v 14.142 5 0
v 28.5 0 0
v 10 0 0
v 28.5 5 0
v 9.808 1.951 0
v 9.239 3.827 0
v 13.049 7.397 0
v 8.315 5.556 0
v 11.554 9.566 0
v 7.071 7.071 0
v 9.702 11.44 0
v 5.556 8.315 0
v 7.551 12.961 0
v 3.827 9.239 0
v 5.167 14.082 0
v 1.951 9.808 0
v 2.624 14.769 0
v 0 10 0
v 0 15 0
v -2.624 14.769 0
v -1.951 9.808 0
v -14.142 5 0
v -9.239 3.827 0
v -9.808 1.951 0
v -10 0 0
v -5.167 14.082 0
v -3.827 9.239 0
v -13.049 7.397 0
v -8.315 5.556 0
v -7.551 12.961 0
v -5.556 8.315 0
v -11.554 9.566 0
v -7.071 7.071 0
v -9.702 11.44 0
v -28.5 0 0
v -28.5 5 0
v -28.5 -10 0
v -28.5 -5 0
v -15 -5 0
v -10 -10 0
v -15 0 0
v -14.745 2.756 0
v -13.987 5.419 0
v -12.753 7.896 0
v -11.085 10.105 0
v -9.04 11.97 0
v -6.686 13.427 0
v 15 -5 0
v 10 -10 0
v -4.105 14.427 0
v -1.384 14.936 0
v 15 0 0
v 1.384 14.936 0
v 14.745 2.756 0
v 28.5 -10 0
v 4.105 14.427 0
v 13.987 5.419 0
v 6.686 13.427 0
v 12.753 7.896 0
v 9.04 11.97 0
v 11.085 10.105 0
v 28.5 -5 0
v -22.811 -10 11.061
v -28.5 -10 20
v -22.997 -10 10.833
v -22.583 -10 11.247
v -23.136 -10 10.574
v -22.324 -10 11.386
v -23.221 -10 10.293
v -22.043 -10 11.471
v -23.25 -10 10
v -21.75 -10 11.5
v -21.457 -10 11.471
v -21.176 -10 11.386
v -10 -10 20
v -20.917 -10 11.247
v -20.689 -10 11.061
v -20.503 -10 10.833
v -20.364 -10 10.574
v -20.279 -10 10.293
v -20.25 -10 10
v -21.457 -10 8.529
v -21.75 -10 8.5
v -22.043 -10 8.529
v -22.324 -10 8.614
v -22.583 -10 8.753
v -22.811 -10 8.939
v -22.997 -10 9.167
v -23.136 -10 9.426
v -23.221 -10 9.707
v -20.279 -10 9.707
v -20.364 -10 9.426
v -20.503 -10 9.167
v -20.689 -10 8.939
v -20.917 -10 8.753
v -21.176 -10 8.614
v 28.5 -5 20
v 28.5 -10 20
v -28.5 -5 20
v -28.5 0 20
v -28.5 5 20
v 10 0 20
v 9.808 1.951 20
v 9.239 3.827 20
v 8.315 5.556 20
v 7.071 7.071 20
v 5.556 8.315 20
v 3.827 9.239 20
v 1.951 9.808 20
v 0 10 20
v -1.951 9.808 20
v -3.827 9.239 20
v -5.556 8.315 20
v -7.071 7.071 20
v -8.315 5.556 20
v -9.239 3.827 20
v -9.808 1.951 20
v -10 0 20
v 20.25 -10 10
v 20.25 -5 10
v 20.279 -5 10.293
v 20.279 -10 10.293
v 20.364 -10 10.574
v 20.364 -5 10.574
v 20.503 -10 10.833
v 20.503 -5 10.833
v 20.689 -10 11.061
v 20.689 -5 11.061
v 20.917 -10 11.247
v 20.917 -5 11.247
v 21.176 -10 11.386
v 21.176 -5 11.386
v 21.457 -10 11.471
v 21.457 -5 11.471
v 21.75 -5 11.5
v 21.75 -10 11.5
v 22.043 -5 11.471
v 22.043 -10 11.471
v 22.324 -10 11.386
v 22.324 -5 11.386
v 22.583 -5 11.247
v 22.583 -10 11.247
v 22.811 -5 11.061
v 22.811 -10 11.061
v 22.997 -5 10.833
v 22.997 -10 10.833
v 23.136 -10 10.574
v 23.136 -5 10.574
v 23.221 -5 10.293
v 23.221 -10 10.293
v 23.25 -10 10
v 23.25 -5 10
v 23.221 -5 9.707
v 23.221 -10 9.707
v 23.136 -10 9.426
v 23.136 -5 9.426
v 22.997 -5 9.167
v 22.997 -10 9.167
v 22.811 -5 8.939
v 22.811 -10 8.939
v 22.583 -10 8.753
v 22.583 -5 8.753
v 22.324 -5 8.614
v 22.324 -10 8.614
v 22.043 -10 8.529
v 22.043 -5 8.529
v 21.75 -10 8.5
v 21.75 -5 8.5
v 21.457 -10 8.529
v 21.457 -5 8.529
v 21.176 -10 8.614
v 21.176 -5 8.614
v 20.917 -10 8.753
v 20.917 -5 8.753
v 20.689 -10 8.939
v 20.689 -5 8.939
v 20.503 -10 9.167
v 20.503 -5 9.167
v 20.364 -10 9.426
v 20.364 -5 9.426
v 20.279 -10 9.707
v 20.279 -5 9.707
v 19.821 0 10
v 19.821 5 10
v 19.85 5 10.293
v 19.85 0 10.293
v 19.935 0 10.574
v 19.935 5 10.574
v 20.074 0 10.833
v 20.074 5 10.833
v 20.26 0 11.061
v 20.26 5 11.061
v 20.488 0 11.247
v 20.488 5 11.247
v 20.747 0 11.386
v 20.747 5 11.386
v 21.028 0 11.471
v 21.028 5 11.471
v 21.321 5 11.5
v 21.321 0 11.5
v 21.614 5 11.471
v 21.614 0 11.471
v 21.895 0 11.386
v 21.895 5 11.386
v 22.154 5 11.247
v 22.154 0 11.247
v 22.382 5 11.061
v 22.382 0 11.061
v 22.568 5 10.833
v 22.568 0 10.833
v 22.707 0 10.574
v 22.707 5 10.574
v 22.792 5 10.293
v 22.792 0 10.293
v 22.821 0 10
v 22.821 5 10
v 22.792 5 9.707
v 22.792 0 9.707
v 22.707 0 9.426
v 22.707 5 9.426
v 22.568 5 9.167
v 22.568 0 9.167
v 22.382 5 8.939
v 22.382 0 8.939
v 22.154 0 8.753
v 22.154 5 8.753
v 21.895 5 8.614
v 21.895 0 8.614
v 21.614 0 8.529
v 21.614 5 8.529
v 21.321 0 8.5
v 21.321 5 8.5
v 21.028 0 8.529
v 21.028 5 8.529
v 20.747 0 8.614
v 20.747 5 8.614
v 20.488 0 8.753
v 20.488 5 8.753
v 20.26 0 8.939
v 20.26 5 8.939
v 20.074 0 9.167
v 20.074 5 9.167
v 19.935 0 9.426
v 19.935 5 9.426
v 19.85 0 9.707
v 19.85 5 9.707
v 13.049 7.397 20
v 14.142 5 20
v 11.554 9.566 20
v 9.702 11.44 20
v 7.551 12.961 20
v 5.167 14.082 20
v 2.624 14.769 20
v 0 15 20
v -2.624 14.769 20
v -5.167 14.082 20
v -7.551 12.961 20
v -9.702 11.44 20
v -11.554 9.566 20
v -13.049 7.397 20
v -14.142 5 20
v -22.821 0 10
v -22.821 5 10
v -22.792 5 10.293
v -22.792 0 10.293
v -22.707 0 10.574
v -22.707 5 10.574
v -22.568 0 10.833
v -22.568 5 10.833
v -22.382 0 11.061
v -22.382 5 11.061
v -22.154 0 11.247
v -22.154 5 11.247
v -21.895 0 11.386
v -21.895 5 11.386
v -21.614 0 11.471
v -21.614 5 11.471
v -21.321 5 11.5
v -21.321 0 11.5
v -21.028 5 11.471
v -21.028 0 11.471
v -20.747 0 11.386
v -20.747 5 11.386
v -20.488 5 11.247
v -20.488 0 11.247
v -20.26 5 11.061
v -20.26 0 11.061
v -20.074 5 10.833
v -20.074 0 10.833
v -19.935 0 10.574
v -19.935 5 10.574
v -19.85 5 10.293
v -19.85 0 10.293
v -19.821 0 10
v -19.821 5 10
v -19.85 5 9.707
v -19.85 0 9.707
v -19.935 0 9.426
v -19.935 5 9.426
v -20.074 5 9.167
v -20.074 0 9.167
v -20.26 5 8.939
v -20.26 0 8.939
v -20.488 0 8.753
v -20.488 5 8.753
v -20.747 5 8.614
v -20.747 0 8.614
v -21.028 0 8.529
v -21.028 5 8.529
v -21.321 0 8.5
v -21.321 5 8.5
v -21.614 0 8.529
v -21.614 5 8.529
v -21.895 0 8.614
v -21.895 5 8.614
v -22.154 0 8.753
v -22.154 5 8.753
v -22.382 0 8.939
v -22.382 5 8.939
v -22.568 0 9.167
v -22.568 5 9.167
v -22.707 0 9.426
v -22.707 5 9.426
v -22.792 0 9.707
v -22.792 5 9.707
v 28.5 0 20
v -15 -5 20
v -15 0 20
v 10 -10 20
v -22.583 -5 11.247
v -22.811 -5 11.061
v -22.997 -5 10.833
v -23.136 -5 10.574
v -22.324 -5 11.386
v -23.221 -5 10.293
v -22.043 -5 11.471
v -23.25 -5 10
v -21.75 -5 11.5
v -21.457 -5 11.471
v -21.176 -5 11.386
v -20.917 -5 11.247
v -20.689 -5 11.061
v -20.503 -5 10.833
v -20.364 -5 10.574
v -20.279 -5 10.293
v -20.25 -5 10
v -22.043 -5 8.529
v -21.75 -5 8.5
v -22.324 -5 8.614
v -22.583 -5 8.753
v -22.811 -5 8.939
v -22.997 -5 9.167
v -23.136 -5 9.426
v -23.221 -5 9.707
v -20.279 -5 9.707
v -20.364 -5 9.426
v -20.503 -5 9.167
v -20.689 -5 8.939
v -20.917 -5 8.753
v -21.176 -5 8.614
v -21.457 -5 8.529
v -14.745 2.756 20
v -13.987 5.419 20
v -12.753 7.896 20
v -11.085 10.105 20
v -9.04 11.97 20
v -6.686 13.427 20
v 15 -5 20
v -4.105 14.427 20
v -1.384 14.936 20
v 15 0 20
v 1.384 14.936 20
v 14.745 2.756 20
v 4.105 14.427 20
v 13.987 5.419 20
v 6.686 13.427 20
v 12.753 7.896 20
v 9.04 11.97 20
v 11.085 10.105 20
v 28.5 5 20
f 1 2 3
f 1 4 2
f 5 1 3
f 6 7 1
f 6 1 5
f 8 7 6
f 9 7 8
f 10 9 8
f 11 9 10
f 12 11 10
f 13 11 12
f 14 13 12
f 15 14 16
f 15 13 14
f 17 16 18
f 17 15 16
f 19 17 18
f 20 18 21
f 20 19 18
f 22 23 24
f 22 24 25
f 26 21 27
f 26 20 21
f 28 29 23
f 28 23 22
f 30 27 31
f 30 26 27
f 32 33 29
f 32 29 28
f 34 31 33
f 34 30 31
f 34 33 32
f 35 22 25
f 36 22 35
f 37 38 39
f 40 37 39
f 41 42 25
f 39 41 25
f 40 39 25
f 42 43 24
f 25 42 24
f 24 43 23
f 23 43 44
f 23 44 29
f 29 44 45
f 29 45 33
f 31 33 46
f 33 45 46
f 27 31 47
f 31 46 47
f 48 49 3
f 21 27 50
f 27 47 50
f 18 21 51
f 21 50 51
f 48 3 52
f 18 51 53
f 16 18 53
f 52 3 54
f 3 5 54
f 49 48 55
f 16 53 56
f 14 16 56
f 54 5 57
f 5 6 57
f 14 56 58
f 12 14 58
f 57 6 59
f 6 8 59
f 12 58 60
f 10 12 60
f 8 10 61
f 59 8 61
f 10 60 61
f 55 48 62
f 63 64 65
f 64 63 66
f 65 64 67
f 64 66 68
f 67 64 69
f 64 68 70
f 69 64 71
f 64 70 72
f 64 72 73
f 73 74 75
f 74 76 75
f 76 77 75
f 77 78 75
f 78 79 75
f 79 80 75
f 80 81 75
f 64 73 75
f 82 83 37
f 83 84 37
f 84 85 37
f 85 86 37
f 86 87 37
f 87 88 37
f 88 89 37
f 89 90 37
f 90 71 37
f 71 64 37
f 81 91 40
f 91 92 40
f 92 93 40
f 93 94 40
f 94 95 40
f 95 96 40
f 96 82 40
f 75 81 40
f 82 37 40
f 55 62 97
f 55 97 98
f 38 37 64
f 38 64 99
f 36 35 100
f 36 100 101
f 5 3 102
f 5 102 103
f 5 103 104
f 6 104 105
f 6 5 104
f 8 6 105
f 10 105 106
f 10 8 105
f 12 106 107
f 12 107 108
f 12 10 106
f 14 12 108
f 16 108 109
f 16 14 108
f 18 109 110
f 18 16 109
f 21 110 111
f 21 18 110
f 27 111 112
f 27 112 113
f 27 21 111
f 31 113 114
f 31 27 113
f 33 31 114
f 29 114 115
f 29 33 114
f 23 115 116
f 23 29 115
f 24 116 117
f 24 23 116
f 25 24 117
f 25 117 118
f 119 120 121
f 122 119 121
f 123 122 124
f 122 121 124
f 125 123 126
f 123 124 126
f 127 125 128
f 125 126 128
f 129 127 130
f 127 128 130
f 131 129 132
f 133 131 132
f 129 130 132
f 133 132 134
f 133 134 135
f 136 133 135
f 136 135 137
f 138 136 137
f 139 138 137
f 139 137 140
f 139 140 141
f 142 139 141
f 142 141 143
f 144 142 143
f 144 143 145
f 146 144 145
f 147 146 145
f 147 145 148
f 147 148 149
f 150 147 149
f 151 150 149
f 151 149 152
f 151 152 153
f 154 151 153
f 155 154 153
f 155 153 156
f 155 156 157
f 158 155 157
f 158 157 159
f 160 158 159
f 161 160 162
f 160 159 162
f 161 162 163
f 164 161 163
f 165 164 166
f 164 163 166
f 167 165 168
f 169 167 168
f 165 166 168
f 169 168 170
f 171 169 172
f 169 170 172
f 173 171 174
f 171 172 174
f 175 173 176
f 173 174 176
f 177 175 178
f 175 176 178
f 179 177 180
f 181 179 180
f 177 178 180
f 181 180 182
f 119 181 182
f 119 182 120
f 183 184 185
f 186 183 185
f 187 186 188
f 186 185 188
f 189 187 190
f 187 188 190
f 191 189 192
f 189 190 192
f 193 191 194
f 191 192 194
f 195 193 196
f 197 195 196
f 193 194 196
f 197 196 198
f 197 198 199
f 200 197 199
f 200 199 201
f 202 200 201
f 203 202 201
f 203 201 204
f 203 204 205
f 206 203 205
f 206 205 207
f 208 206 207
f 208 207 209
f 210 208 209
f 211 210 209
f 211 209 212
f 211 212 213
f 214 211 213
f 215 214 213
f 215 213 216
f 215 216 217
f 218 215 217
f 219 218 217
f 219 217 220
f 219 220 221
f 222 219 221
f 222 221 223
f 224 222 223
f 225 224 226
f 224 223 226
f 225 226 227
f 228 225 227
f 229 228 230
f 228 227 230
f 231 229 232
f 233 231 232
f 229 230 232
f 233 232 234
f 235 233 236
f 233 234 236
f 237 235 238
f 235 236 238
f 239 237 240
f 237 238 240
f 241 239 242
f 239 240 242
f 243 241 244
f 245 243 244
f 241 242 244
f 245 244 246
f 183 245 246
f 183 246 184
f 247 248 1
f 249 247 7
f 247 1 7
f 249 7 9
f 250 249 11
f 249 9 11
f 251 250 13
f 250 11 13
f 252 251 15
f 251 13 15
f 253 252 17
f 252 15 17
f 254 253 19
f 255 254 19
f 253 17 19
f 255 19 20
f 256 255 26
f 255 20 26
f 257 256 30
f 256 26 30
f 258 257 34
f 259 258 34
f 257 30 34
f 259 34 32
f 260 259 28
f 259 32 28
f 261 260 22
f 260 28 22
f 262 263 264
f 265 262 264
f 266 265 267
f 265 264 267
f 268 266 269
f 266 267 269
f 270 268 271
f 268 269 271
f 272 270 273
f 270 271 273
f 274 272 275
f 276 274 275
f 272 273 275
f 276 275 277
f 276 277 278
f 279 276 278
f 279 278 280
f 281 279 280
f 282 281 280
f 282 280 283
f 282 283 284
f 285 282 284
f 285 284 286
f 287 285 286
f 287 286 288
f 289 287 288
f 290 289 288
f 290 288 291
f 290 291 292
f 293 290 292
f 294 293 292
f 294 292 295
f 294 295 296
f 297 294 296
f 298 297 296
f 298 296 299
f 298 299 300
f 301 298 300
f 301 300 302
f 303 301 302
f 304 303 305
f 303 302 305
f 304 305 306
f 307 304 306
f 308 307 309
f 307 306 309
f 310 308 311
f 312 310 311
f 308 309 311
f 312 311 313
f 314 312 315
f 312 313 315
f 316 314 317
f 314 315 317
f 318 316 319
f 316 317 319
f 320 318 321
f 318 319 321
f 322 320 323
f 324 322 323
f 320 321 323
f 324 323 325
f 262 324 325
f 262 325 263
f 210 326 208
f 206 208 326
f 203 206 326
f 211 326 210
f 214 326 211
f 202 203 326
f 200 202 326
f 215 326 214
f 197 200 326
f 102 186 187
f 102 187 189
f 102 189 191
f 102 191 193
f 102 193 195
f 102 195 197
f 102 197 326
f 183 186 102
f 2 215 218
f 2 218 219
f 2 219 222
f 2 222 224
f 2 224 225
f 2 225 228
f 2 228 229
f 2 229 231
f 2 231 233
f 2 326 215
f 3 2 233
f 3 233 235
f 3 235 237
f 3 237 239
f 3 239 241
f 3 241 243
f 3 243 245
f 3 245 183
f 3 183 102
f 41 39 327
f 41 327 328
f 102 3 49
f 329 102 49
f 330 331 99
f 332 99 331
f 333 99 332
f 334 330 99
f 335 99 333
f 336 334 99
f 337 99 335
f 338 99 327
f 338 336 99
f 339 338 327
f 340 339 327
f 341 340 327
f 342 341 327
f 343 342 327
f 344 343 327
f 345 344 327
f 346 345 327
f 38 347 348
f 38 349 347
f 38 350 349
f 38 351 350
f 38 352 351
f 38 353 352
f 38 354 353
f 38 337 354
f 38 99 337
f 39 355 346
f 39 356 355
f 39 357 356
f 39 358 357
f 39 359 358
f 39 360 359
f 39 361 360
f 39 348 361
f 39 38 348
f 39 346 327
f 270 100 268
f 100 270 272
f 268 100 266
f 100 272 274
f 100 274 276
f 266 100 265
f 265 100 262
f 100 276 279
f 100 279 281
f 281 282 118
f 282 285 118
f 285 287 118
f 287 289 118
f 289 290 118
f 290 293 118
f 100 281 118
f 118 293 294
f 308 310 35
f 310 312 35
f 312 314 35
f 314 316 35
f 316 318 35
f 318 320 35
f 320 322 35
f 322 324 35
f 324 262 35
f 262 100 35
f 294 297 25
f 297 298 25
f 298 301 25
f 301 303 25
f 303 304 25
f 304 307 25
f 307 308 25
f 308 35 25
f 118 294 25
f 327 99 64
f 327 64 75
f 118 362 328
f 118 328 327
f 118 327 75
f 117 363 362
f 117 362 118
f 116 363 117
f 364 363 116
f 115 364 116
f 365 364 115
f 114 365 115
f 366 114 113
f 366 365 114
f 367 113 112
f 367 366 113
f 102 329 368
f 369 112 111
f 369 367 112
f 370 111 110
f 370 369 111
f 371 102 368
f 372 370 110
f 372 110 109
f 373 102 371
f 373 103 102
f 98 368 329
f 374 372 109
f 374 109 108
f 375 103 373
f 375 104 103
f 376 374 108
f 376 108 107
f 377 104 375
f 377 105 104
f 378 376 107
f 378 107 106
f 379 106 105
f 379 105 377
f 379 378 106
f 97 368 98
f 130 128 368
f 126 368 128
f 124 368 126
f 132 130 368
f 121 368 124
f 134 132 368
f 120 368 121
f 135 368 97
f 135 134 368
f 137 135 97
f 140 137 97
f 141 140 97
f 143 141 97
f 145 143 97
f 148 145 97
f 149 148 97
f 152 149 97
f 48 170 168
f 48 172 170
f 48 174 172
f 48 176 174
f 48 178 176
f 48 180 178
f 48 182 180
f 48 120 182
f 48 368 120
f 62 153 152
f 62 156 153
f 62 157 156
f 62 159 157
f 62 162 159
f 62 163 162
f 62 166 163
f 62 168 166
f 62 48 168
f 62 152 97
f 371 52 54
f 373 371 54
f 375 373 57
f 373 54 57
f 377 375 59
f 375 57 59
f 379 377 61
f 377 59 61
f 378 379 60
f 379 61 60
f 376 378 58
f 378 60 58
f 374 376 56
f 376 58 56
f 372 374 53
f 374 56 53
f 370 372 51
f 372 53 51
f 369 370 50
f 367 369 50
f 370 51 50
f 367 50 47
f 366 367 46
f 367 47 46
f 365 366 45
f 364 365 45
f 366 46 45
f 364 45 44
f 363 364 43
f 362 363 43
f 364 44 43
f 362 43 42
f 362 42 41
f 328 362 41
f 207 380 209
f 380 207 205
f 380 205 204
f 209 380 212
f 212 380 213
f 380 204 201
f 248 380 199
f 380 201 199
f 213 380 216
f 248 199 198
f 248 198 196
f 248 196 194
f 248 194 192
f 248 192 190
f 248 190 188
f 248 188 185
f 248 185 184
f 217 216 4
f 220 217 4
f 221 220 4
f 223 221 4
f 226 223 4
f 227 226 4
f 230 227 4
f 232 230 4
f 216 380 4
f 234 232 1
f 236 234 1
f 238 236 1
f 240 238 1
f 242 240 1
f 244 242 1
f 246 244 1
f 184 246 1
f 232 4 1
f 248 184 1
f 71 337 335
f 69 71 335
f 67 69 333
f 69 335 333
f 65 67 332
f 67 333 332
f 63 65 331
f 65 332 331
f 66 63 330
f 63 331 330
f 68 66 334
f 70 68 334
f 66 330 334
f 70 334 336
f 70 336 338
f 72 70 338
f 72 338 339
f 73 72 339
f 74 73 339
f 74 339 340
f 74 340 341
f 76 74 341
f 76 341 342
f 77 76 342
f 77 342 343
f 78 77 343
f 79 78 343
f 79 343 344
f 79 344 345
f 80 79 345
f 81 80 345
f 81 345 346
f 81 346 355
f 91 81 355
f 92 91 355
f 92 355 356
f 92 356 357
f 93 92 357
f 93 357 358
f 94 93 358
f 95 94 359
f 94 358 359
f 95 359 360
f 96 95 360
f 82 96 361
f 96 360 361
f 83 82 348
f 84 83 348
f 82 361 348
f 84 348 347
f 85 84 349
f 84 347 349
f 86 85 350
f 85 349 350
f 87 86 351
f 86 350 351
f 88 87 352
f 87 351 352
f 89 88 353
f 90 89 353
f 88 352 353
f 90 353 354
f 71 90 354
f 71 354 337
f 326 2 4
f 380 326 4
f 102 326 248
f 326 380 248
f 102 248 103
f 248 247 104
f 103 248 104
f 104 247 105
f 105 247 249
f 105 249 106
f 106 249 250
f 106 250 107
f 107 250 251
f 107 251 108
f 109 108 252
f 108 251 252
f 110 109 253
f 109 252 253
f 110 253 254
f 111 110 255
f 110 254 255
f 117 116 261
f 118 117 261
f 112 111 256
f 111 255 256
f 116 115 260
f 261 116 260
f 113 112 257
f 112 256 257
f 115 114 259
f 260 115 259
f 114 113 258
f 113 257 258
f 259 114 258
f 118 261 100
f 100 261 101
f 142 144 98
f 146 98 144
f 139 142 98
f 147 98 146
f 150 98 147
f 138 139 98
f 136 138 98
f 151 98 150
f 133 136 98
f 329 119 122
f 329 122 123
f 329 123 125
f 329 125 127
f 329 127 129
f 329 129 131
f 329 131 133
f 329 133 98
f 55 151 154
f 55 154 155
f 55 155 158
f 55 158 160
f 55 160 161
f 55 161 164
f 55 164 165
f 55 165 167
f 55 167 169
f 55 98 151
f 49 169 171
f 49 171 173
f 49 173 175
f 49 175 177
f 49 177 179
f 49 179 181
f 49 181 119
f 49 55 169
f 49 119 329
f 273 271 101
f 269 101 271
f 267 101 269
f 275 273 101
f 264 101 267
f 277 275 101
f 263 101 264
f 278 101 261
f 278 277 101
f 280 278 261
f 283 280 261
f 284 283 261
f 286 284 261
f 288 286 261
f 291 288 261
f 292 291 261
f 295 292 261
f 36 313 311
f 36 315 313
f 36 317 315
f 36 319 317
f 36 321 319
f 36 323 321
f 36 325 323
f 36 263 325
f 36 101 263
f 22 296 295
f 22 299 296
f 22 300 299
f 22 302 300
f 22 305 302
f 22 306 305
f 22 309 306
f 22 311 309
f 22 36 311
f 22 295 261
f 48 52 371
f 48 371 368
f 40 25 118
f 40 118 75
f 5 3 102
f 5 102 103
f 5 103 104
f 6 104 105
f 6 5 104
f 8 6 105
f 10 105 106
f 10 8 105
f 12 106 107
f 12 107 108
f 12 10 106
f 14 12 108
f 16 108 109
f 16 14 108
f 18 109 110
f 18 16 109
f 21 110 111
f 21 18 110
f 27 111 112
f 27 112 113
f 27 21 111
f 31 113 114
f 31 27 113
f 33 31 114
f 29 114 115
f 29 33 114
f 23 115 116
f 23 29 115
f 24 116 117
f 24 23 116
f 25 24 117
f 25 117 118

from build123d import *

# Parameters (mm, degrees)
PAD_DEPTH       = 20
SKETCH001_R     = 1.5
POCKET_DEPTH    = 5.001
PAD001_DEPTH    = 20
SKETCH004_R     = 1.5
POCKET001_DEPTH = 5.001


with BuildPart() as body:
    # Sketch → Pad (new body)
    with BuildSketch(Plane.XY):
        with BuildLine():
            Line((28.5, 0), (10, 0))
            ThreePointArc((10, 0), (0, 10), (-10, 0))
            Line((-28.5, 0), (-10, 0))
            Line((-28.5, 0), (-28.5, 5))
            Line((-28.5, 5), (-14.142136, 5))
            ThreePointArc((14.142136, 5), (0, 15), (-14.142136, 5))
            Line((28.5, 5), (14.142136, 5))
            Line((28.5, 0), (28.5, 5))
        make_face()
    extrude(amount=PAD_DEPTH)

    # Sketch001 (on Face7 of Pad) → Pocket (cut, through all)
    with BuildSketch(Plane(origin=(0, 5, 0), x_dir=(-1, 0, 0), z_dir=(0, 1, 0))):
        with Locations((-21.321068, 10)):
            Circle(SKETCH001_R)
        with Locations((21.321068, 10)):
            Circle(SKETCH001_R)
    extrude(amount=-POCKET_DEPTH, mode=Mode.SUBTRACT)


with BuildPart() as body001:
    # Sketch002 → Pad001 (new body)
    with BuildSketch(Plane.XY):
        with BuildLine():
            ThreePointArc((15, 0), (0, 15), (-15, 0))
            Line((-15, -5), (-15, 0))
            Line((-28.5, -5), (-15, -5))
            Line((-28.5, -10), (-28.5, -5))
            Line((-28.5, -10), (-10, -10))
            Line((-10, 0), (-10, -10))
            ThreePointArc((10, 0), (0, 10), (-10, 0))
            Line((10, 0), (10, -10))
            Line((28.5, -10), (10, -10))
            Line((28.5, -5), (28.5, -10))
            Line((15, -5), (28.5, -5))
            Line((15, 0), (15, -5))
        make_face()
    extrude(amount=PAD001_DEPTH)

    # Sketch004 (on Face11 of Pad001) → Pocket001 (cut, through all)
    with BuildSketch(Plane(origin=(0, -5, 0), x_dir=(-1, 0, 0), z_dir=(0, 1, 0))):
        with Locations((-21.75, 10)):
            Circle(SKETCH004_R)
        with Locations((21.75, 10)):
            Circle(SKETCH004_R)
    extrude(amount=-POCKET001_DEPTH, mode=Mode.SUBTRACT)


solid = Compound([body.part, body001.part])
